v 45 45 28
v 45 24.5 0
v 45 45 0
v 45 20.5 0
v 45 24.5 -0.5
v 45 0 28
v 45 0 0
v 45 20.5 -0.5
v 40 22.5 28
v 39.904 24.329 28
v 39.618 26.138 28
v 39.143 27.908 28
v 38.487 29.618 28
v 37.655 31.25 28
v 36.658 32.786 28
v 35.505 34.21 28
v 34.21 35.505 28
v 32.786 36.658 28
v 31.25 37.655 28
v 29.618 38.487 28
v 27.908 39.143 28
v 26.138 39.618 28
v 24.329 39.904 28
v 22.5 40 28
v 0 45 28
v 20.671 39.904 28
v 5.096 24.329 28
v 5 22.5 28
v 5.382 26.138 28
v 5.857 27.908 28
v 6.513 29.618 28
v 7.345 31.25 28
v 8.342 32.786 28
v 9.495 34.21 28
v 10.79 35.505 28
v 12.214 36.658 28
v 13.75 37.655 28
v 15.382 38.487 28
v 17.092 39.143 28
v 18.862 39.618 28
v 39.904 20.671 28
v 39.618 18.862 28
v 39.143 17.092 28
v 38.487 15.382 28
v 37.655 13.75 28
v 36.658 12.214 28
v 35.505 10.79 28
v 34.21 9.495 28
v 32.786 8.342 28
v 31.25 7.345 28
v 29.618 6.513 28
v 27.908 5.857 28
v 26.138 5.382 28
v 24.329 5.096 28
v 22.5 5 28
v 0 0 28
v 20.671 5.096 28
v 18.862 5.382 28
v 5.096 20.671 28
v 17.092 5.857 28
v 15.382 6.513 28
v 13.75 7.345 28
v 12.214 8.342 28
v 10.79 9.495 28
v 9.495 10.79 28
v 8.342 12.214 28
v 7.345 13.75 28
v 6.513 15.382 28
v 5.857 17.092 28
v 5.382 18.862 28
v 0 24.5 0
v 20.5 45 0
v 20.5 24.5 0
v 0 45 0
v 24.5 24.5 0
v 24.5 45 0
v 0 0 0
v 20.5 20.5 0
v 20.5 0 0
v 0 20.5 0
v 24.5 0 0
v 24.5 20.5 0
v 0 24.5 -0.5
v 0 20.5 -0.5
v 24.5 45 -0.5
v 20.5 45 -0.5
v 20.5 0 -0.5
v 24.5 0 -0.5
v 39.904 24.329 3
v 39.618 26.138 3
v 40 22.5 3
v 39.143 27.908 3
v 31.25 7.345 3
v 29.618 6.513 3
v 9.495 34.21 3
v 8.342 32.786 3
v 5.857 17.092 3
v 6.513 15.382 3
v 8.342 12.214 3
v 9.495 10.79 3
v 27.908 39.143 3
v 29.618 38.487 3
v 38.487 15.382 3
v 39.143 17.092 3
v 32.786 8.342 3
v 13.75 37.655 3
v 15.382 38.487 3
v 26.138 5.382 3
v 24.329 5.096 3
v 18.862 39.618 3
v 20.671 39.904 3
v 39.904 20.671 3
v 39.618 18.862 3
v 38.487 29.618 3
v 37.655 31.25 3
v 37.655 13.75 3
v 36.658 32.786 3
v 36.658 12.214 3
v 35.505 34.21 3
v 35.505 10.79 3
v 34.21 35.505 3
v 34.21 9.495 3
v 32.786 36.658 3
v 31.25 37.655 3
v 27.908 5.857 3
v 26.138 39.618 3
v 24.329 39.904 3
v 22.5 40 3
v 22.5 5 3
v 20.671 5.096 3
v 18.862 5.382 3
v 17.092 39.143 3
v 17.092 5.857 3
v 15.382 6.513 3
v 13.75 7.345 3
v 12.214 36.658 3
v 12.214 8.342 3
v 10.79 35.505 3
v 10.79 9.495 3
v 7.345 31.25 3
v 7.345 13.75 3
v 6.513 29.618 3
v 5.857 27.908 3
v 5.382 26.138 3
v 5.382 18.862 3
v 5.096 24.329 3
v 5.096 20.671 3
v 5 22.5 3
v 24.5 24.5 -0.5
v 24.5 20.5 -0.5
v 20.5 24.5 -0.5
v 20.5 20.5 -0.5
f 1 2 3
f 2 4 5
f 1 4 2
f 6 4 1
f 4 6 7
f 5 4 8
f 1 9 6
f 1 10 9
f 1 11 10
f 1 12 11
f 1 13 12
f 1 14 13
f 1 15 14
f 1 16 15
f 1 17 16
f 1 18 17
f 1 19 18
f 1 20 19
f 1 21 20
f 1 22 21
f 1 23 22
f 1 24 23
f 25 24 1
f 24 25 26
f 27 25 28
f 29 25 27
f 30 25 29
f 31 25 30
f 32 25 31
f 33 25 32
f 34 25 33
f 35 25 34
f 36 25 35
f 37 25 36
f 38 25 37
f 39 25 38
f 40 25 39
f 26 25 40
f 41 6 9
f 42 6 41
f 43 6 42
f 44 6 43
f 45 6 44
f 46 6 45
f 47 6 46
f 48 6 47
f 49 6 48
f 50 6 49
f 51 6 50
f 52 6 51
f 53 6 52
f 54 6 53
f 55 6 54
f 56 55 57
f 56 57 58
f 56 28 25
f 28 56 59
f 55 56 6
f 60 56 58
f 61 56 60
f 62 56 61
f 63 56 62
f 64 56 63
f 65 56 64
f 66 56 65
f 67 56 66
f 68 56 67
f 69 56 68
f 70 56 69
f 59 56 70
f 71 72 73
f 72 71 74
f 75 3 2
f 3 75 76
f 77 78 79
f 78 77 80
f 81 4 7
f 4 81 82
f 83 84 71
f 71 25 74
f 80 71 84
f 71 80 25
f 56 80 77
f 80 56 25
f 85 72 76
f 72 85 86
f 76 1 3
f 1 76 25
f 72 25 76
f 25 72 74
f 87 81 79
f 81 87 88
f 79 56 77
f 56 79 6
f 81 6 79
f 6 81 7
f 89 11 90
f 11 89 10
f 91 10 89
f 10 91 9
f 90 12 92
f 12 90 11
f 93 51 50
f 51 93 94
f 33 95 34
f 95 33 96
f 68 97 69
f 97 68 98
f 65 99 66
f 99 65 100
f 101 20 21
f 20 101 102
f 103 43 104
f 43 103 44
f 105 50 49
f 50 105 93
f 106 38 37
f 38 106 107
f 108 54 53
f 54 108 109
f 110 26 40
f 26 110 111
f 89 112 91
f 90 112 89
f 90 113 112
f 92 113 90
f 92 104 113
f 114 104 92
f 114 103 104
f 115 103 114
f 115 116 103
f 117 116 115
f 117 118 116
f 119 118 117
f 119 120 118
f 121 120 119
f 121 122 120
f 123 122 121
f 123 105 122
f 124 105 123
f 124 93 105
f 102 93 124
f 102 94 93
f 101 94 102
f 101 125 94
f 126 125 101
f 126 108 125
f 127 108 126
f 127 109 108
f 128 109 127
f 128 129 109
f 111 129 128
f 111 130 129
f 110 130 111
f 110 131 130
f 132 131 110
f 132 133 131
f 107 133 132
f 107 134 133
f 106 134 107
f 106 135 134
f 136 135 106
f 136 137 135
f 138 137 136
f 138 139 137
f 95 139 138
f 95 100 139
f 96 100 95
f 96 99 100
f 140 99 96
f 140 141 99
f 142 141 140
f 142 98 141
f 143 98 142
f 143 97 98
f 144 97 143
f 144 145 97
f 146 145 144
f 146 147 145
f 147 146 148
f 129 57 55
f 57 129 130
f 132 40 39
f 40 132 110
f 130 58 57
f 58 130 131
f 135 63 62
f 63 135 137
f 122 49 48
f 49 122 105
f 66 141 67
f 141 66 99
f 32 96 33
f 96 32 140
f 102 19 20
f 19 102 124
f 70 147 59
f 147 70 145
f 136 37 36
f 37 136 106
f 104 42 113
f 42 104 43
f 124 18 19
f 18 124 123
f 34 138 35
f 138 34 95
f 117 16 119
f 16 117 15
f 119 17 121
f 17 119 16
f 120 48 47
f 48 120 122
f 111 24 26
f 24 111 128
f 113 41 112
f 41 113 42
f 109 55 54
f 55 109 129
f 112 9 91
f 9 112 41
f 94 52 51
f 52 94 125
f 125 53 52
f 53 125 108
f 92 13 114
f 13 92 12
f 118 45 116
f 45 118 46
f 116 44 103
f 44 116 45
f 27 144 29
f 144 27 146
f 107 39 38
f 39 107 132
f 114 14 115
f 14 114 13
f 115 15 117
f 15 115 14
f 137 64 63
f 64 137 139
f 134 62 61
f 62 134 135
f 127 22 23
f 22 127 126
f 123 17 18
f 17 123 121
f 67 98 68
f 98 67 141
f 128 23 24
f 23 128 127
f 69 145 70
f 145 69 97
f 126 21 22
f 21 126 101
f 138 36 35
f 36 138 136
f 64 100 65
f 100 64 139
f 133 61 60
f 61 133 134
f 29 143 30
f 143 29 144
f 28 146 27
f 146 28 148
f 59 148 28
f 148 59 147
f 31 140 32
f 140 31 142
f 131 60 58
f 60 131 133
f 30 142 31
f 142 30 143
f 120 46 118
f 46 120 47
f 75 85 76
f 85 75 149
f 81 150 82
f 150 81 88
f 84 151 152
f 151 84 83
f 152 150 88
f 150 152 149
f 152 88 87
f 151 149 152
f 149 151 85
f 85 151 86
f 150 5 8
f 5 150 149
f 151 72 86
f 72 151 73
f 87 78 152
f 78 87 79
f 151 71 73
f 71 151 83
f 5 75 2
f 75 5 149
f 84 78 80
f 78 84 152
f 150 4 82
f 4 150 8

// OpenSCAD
// ============================================
// weight_guide.scad
// ゲルパッド上に錘 (0..50 g) を中心配置するためのガイドプレート。
// 上面：錘が座る円形凹み。底面：（任意の）十字リブで接触面積を限定。
// 印刷向き：凹み側を上に。凹み内面に ironing 推奨。
// ============================================

include <params.scad>

// Phase 1：Ø35×25mm 凹（円柱磁石 Ø10×2mm の積み重ね 48/96 個、または六角ナット
// を共通の凹に収める）。上面開放、上端から重りが突き出る運用。
guide_x = weight_guide_outer_mm;        // 45
guide_y = weight_guide_outer_mm;        // 45
guide_z = weight_guide_thickness_mm;    // 28（凹深 25 + 床 3）

recess_d = weight_cavity_d_mm;          // 35
recess_h = weight_cavity_h_mm;          // 25

// 十字リブ（接触面積を中心 1 点近傍に集約）
rib_thickness = 0.5;     // ゲル接触面からの突き出し厚（z 方向）
rib_width     = 4;       // リブの幅（X 軸リブの Y 幅、Y 軸リブの X 幅）

eps = 0.01;

module weight_recess() {
    // 上面 (z = guide_z) から深さ recess_h、底は平面
    translate([guide_x / 2, guide_y / 2, guide_z - recess_h])
        cylinder(d = recess_d, h = recess_h + eps);
}

module bottom_cross_rib() {
    // 底面 (z = 0) から下方向に rib_thickness 突き出す十字。
    // ゲル接触面積を中心の細い領域に絞り、加重を中心に集中させる。
    translate([(guide_x - rib_width) / 2, 0, -rib_thickness])
        cube([rib_width, guide_y, rib_thickness]);
    translate([0, (guide_y - rib_width) / 2, -rib_thickness])
        cube([guide_x, rib_width, rib_thickness]);
}

module weight_guide(with_rib = true) {
    union() {
        difference() {
            cube([guide_x, guide_y, guide_z]);
            weight_recess();
        }
        if (with_rib)
            bottom_cross_rib();
    }
}

// --- レンダ選択 ---
// 比較実験用に「リブ有り」「リブ無し」の 2 形態を用意。
// 既定はリブ有り。リブ無し版を印刷したい場合は下行を切り替える。
weight_guide(with_rib = true);
// weight_guide(with_rib = false);
